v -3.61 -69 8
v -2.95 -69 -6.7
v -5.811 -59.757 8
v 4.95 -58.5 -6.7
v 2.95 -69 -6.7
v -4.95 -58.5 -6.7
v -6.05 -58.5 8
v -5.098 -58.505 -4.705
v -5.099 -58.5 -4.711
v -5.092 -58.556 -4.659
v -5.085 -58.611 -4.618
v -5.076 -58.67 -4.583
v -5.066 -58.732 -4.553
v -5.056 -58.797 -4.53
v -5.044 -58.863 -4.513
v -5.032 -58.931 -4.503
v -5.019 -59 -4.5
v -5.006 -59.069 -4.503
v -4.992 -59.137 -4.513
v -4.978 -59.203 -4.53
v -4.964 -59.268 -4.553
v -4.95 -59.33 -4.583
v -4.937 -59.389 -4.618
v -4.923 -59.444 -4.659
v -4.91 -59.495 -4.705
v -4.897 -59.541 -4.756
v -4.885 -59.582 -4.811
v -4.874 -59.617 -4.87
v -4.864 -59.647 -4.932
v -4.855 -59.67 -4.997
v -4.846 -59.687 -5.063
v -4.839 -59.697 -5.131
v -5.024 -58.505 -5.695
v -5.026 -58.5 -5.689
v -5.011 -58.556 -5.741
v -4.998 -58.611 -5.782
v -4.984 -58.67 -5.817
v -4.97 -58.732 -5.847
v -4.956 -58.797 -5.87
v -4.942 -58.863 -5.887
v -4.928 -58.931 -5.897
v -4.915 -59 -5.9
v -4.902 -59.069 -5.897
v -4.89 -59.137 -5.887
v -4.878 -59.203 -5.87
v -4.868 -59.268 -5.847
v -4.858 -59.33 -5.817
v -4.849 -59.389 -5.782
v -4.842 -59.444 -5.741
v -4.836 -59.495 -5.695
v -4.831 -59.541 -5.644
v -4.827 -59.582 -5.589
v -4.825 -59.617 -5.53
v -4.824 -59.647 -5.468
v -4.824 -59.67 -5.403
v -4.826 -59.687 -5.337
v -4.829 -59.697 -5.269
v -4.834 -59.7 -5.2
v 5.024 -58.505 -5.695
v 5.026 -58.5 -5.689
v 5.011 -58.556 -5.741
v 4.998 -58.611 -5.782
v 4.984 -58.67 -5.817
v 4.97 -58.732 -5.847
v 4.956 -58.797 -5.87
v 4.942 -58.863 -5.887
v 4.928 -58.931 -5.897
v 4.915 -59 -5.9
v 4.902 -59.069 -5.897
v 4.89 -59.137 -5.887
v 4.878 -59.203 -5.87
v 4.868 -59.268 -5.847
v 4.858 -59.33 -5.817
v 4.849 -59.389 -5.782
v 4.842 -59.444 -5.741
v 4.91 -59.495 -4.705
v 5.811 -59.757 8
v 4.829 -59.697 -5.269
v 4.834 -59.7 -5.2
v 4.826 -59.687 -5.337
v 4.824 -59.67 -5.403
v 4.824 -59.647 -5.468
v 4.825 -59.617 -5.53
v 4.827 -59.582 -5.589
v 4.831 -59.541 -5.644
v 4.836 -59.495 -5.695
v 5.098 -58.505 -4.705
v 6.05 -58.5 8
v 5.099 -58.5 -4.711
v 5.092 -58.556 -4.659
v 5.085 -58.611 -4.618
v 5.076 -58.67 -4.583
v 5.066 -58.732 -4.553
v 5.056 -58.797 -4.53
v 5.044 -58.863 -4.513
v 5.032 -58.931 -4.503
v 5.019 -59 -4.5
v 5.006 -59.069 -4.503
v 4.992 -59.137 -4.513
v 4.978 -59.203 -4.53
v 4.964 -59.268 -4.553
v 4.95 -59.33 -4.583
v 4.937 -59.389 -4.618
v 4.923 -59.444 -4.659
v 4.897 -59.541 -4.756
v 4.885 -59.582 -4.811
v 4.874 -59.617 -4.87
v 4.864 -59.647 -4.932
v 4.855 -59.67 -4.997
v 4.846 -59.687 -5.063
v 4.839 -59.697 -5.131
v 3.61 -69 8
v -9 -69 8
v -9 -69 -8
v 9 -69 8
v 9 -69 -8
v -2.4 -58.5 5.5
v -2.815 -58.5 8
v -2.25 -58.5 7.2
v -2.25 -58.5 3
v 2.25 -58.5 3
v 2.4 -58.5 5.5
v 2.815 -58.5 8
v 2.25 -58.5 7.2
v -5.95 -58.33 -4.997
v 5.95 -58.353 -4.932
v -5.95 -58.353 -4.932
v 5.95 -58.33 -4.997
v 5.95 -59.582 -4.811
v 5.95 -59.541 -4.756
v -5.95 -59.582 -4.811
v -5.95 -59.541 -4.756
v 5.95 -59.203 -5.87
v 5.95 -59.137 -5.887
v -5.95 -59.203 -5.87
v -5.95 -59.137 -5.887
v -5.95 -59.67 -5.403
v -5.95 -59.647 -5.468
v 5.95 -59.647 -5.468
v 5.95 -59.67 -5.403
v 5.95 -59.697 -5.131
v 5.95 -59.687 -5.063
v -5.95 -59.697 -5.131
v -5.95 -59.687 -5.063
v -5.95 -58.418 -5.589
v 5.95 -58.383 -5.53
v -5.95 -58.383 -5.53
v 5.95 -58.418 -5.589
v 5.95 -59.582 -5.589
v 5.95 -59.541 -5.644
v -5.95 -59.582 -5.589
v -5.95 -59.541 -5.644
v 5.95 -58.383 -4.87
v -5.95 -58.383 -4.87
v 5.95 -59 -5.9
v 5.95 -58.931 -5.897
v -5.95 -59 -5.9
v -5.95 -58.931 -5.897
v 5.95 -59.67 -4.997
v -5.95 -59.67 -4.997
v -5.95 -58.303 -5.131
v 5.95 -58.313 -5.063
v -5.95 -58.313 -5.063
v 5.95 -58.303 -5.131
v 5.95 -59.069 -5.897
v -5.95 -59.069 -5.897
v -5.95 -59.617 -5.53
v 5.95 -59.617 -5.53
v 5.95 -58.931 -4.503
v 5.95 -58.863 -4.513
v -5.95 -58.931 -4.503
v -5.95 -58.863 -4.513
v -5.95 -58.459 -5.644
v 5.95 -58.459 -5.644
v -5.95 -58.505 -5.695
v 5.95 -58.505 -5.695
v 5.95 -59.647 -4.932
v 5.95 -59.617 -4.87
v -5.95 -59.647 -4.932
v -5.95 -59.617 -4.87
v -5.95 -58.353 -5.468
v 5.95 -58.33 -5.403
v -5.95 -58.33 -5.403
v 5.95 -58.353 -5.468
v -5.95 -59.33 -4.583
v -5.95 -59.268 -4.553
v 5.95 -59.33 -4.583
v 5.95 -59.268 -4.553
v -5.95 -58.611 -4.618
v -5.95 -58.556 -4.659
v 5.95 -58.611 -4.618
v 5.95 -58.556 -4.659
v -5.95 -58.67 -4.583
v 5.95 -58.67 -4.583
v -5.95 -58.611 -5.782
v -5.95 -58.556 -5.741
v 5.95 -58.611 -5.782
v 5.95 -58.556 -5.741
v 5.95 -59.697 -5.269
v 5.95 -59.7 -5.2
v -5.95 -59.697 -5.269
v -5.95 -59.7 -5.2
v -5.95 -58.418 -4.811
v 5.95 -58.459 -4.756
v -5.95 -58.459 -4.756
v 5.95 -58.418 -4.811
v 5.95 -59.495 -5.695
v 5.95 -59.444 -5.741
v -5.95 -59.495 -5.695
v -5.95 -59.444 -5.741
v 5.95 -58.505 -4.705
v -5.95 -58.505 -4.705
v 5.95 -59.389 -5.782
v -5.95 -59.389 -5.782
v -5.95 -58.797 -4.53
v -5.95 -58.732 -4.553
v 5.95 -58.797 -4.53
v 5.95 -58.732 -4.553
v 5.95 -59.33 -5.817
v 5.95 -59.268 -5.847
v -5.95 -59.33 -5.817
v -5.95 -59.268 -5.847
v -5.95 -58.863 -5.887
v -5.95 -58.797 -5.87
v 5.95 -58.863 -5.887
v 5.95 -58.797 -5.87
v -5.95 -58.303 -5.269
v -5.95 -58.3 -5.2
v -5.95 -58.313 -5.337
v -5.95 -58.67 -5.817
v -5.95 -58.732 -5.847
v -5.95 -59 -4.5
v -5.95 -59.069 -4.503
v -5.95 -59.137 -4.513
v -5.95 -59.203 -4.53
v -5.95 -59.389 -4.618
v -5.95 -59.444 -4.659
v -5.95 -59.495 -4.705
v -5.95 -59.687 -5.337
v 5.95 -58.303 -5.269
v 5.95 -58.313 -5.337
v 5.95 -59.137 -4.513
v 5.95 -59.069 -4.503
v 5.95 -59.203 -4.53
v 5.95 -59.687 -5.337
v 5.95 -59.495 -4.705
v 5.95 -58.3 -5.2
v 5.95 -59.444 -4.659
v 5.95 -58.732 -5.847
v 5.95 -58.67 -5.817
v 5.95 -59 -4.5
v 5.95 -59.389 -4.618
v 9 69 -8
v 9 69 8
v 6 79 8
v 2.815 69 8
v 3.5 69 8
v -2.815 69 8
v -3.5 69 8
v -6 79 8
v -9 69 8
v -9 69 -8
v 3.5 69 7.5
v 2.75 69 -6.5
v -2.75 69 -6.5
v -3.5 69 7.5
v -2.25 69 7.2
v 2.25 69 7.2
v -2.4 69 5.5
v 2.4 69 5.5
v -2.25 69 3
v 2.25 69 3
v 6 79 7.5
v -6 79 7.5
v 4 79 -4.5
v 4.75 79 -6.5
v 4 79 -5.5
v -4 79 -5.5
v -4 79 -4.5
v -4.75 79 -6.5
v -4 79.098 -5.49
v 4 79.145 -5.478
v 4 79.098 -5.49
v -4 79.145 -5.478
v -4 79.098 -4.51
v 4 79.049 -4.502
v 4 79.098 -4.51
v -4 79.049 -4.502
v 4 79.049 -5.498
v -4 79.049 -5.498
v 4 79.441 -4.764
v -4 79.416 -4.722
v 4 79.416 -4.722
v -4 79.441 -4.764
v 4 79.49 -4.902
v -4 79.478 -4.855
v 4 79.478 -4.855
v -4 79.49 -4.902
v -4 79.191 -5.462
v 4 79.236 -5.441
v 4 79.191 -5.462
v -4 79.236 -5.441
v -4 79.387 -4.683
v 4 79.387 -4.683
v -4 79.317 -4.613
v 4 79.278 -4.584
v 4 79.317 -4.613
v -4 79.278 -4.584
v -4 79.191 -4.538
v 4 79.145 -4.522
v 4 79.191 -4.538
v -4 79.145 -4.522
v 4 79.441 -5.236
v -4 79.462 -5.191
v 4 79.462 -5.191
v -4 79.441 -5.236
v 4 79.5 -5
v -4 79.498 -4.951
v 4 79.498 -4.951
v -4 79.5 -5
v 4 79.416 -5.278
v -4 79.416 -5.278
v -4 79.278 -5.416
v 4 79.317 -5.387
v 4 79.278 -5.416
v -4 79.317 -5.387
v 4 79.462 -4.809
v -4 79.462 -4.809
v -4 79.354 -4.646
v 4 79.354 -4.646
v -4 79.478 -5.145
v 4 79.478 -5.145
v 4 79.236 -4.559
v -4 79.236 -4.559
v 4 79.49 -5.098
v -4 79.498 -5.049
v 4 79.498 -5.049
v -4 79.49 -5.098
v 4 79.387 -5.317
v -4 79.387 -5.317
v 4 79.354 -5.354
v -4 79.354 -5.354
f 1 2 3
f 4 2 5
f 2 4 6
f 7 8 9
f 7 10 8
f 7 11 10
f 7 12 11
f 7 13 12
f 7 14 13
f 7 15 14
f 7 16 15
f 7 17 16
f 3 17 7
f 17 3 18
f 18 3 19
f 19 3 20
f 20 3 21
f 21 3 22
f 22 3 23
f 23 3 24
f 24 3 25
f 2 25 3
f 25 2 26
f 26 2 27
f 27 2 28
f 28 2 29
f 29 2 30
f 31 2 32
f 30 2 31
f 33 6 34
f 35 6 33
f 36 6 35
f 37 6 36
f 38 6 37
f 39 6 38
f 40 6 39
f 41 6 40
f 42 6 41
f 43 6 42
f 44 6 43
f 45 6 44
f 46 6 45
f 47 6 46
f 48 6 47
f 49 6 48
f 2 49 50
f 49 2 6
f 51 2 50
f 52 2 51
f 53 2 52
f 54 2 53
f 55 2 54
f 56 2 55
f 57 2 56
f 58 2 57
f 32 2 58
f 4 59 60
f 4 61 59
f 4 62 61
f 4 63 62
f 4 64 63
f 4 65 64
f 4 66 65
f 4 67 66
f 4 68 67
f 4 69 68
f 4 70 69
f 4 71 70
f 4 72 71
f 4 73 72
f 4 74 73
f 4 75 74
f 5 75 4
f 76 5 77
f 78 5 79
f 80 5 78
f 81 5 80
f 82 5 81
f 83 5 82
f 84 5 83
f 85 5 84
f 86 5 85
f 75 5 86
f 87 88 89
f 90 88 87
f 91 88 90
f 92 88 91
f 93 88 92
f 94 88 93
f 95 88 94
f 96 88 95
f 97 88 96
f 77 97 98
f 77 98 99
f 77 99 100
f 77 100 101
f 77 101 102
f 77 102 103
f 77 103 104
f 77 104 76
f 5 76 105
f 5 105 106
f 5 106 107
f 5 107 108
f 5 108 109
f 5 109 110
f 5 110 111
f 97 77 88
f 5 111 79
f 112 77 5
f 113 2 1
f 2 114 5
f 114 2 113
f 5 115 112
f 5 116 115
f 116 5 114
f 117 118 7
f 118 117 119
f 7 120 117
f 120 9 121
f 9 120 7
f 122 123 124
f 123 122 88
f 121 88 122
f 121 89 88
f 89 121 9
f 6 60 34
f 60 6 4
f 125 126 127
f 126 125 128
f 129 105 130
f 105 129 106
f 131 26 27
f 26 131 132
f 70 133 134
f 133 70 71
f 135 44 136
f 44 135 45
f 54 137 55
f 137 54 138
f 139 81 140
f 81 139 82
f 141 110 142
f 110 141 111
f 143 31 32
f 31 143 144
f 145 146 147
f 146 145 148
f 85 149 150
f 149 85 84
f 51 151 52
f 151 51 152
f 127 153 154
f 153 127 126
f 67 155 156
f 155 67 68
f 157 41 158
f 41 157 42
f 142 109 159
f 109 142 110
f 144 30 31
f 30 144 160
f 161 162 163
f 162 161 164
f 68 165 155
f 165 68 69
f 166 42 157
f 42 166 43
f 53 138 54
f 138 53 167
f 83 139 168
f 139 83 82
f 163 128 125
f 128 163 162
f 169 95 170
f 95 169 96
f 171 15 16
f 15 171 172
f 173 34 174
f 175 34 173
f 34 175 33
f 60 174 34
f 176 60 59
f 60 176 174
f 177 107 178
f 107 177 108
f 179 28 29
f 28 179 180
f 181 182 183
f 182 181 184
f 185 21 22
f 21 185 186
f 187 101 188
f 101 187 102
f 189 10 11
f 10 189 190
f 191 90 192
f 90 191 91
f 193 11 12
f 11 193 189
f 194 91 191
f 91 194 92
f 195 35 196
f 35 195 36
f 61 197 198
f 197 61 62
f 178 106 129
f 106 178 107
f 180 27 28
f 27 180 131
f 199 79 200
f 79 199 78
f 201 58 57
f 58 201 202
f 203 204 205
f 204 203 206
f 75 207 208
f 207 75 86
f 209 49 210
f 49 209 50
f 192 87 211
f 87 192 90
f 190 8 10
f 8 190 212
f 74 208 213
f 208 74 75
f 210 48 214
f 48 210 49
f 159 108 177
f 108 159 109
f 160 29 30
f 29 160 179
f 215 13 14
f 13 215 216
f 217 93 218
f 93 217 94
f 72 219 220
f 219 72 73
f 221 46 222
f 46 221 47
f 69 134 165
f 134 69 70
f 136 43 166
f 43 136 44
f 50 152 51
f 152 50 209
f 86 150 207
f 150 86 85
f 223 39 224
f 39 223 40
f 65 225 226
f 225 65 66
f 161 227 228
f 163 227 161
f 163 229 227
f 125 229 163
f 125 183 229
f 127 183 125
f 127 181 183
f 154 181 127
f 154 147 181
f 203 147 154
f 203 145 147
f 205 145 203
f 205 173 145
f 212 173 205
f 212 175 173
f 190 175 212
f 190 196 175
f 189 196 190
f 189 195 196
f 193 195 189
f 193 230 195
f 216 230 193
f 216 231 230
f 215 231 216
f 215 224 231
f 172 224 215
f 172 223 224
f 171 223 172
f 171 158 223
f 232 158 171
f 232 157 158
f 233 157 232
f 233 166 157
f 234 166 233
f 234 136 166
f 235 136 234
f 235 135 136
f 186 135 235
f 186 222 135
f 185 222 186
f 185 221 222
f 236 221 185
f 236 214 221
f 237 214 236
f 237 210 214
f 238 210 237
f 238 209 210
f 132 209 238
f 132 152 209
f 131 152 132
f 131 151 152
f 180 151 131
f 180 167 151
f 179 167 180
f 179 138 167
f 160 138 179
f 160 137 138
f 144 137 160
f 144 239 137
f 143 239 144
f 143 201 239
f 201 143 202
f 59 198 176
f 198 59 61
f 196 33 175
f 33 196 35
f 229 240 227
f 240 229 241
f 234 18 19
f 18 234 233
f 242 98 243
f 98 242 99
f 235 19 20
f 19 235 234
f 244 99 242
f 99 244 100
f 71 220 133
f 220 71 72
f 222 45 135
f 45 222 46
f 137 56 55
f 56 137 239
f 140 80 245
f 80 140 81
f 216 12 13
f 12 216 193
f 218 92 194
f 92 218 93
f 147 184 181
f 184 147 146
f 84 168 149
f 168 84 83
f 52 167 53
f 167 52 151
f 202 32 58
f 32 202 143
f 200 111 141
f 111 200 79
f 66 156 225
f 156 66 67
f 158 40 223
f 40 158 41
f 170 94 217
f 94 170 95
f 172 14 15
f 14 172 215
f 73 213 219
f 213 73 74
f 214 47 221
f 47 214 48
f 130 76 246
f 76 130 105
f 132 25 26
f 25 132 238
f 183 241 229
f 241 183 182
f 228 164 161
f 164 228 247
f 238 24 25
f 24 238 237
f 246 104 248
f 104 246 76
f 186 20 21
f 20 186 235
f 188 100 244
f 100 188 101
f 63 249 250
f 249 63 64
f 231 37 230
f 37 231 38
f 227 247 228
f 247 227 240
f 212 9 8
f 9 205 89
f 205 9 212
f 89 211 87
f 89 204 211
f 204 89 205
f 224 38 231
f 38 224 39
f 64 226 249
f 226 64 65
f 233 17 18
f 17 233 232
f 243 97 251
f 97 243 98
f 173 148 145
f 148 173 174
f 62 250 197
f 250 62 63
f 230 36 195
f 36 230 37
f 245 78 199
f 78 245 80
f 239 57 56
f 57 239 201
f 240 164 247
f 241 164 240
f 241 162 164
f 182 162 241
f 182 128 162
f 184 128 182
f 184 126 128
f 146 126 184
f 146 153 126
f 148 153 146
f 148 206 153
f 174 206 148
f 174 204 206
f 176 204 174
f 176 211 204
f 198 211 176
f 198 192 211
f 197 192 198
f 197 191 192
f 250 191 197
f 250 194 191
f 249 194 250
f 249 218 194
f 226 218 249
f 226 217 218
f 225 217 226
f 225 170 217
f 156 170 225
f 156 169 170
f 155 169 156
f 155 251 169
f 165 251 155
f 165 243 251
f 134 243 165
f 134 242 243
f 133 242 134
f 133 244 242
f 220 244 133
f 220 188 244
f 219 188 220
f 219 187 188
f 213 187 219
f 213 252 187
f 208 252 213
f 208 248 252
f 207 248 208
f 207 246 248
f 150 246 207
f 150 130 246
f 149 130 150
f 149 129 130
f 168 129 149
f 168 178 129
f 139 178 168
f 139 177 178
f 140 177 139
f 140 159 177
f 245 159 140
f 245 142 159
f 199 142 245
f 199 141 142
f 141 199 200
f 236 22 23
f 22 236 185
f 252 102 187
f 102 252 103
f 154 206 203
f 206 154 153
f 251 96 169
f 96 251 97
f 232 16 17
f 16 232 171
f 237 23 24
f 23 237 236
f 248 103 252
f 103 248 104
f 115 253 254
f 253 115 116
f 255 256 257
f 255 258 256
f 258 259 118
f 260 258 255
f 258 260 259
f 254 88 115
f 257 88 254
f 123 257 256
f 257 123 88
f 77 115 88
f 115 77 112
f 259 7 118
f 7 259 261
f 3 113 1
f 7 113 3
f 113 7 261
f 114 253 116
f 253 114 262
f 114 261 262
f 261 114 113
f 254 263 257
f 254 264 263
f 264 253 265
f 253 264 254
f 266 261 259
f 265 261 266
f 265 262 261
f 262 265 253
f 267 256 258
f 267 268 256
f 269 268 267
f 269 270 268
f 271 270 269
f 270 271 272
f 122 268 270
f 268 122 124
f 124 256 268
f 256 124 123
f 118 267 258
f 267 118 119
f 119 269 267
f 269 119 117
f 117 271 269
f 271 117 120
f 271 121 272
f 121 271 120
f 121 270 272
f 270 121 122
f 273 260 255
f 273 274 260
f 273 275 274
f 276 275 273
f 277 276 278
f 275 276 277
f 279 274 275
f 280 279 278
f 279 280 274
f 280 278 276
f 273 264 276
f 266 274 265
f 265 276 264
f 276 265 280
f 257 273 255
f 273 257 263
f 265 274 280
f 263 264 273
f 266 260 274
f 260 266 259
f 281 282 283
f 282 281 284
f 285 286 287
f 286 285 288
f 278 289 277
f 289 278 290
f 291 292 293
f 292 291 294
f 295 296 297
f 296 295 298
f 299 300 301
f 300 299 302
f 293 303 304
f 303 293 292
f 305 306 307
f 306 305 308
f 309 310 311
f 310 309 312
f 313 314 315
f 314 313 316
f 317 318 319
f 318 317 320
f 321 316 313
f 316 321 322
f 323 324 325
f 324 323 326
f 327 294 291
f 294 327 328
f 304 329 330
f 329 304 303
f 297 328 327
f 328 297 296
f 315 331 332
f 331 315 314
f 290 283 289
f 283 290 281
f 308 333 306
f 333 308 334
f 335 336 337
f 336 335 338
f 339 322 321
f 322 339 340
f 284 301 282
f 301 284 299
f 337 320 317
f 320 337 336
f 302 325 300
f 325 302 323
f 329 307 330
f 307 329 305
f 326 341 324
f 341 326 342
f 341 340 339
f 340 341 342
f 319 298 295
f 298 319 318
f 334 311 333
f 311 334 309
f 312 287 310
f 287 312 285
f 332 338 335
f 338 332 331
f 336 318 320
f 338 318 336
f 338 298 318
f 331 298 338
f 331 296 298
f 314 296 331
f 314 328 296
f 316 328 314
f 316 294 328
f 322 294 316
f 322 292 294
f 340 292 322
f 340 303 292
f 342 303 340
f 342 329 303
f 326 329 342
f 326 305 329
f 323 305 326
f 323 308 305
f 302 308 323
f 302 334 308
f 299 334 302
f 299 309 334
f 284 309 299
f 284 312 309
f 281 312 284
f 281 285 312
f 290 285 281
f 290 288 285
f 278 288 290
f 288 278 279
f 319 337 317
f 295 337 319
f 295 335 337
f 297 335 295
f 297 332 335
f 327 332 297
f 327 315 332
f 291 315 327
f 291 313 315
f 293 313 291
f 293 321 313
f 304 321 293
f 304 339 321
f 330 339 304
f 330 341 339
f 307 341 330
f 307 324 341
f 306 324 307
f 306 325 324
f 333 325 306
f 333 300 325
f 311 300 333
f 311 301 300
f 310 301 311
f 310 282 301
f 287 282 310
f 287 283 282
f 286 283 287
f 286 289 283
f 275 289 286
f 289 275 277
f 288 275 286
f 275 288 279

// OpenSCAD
// file: ../modules/spline_profile.scad
// ====================================================================
// Cellophane Spline Groove & Compliant Spring Clamping Strip Module
// High-tension retention system with compliant split-core spring prongs
// and directional grip teeth to hold cellophane drum-tight without slipping
// ====================================================================
include <../config.scad>

// Negative volume for cutting the spline groove into any beam surface
// Cuts into the -Z direction from Z=0.
// Axis parameter: "Y" (default) or "X"
module spline_groove_negative(length = 100, axis = "Y") {
    gw = GROOVE_WIDTH; // 4.5 mm
    gd = GROOVE_DEPTH; // 5.0 mm
    
    // Cross-section profile of the groove (in X-Z plane)
    // Features a 45° lead-in chamfer at the mouth and internal retention undercuts
    module groove_cross_section_2d() {
        polygon(points = [
            [-(gw/2 + 0.6),  0.05], // Mouth chamfer outer left
            [-gw/2,         -0.80], // Mouth chamfer inner left
            [-gw/2 - 0.15,  -2.50], // Mid retention undercut left
            [-gw/2,         -gd],   // Bottom left
            [ gw/2,         -gd],   // Bottom right
            [ gw/2 + 0.15,  -2.50], // Mid retention undercut right
            [ gw/2,         -0.80], // Mouth chamfer inner right
            [ (gw/2 + 0.6),  0.05]  // Mouth chamfer outer right
        ]);
    }
    
    if (axis == "Y") {
        rotate([90, 0, 0])
        linear_extrude(height = length, center = true) {
            groove_cross_section_2d();
        }
    } else {
        rotate([0, 90, 0])
        rotate([0, 0, 90])
        linear_extrude(height = length, center = true) {
            groove_cross_section_2d();
        }
    }
}

// 2D Profile of the Compliant Spring-Wedge Spline Clip (X-Z plane)
// Has a central vertical expansion slot that allows the two prongs to flex inward
// during insertion and exert continuous outward spring pressure against the cellophane.
module spline_clip_profile_2d(width_offset = 0) {
    w_cap   = 7.0; // Top thumb-press cap width
    h_cap   = 1.8; // Cap thickness
    h_depth = 4.6; // Insertion depth
    
    // Base dimensions + user/grip offset
    w_shaft = 4.3 + width_offset; // Base shaft (tight fit in 4.5mm groove)
    w_barb1 = 4.7 + width_offset; // Upper retention barb (interferes with groove)
    w_barb2 = 4.8 + width_offset; // Lower primary clamping barb
    w_nose  = 3.2;                // Lead-in nose
    
    difference() {
        union() {
            // 1. Top Thumb-Press Cap (acts as depth stop & pry lip)
            translate([0, h_cap / 2])
            hull() {
                translate([-w_cap/2 + 0.8, -h_cap/2 + 0.4]) circle(r = 0.4, $fn=16);
                translate([ w_cap/2 - 0.8, -h_cap/2 + 0.4]) circle(r = 0.4, $fn=16);
                translate([-w_cap/2 + 1.2,  h_cap/2 - 0.4]) circle(r = 0.4, $fn=16);
                translate([ w_cap/2 - 1.2,  h_cap/2 - 0.4]) circle(r = 0.4, $fn=16);
            }
            
            // 2. Dual-Barb Clamping Prongs
            polygon(points = [
                [-w_shaft/2,        0.0],
                [-w_shaft/2,       -1.2],
                [-w_barb1/2,       -1.9], // Upper barb tooth
                [-w_shaft/2,       -2.1],
                [-w_shaft/2,       -2.8],
                [-w_barb2/2,       -3.5], // Lower primary clamping tooth
                [-w_nose/2,        -h_depth], // Tapered nose
                [ w_nose/2,        -h_depth],
                [ w_barb2/2,       -3.5],
                [ w_shaft/2,       -2.8],
                [ w_shaft/2,       -2.1],
                [ w_barb1/2,       -1.9],
                [ w_shaft/2,       -1.2],
                [ w_shaft/2,        0.0]
            ]);
        }
        
        // 3. Central Vertical Expansion Kerf (0.9 mm compliant flex slot)
        // Splits the shaft into two spring prongs that flex inward upon insertion
        translate([0, -h_depth/2 - 0.6])
        hull() {
            translate([0,  h_depth/2 - 1.2]) circle(r = 0.45, $fn=16);
            translate([0, -h_depth/2 + 0.5]) circle(r = 0.45, $fn=16);
        }
    }
}

// 3D Snap-in Locking Spline Clip (oriented along Y axis by default)
module spline_clip(length = 150, axis = "Y", width_offset = 0) {
    if (axis == "Y") {
        rotate([90, 0, 0])
        linear_extrude(height = length, center = true) {
            spline_clip_profile_2d(width_offset = width_offset);
        }
    } else {
        rotate([0, 90, 0])
        rotate([0, 0, 90])
        linear_extrude(height = length, center = true) {
            spline_clip_profile_2d(width_offset = width_offset);
        }
    }
}
// file: ../modules/dovetail.scad
// ====================================================================
// Dual-Taper Wedge Dovetail Module (Peg-Free, Self-Locking)
// Main Frame Wedge & Mini Door Wedge Systems
// ====================================================================
include <../config.scad>

// 2D Profile of Dovetail Slice in X-Y plane
module dovetail_slice_2d(root_w, tip_w, depth) {
    w_r = root_w / 2;
    w_t = tip_w / 2;
    polygon(points = [
        [-w_r, 0],
        [-w_t, depth],
        [ w_t, depth],
        [ w_r, 0]
    ]);
}

// ----------------------------------------------------
// 1. Main Frame Dual-Taper Wedge Dovetail (24 x 24 mm Profile)
// ----------------------------------------------------
module male_dovetail(
    w = BEAM_WIDTH,
    h = BEAM_HEIGHT,
    depth = DOVETAIL_DEPTH,
    tol = 0
) {
    z_bot = -h/2 + 2.0 + tol; // 2mm bottom ledge
    z_top =  h/2 - tol;       // Flush at top of beam
    
    b_root = FRAME_BOT_ROOT - 2*tol;
    b_tip  = FRAME_BOT_TIP  - 2*tol;
    t_root = FRAME_TOP_ROOT - 2*tol;
    t_tip  = FRAME_TOP_TIP  - 2*tol;
    
    union() {
        hull() {
            translate([0, 0, z_bot])
            linear_extrude(height = 0.5)
            dovetail_slice_2d(b_root, b_tip, depth);
            
            translate([0, 0, z_top - 0.5])
            linear_extrude(height = 0.5)
            dovetail_slice_2d(t_root, t_tip, depth);
        }
        
        // Tactile snap detent bead on the tip face at the bottom
        translate([0, depth, z_bot + 2.0])
        rotate([0, 90, 0])
        cylinder(r = 0.6, h = b_tip - 2, center = true);
    }
}

module female_dovetail_pocket(
    w = BEAM_WIDTH,
    h = BEAM_HEIGHT,
    depth = DOVETAIL_DEPTH,
    tol = TOL_DOVETAIL
) {
    z_bot = -h/2 + 2.0 - tol;
    z_top =  h/2 + 2.0; // Open through top
    
    b_root = FRAME_BOT_ROOT + 2*tol;
    b_tip  = FRAME_BOT_TIP  + 2*tol;
    t_root = FRAME_TOP_ROOT + 2*tol;
    t_tip  = FRAME_TOP_TIP  + 2*tol;
    
    union() {
        mirror([0, 1, 0])
        hull() {
            translate([0, 0, z_bot])
            linear_extrude(height = 0.5)
            dovetail_slice_2d(b_root, b_tip, depth + 0.6);
            
            translate([0, 0, z_top])
            linear_extrude(height = 0.5)
            dovetail_slice_2d(t_root, t_tip, depth + 0.6);
        }
        
        // Matching snap detent groove in the pocket floor
        translate([0, -depth, z_bot + 2.0])
        rotate([0, 90, 0])
        cylinder(r = 0.8, h = b_tip + 2, center = true);
    }
}

// ----------------------------------------------------
// 2. Mini Door Dual-Taper Wedge Dovetail (18 x 16 mm Profile)
// ----------------------------------------------------
module mini_male_dovetail(
    w = DOOR_PROFILE_W,
    h = DOOR_PROFILE_T,
    depth = DOOR_DEPTH,
    tol = 0
) {
    z_bot = -h/2 + 1.5 + tol;
    z_top =  h/2 - tol;
    
    b_root = DOOR_BOT_ROOT - 2*tol;
    b_tip  = DOOR_BOT_TIP  - 2*tol;
    t_root = DOOR_TOP_ROOT - 2*tol;
    t_tip  = DOOR_TOP_TIP  - 2*tol;
    
    union() {
        hull() {
            translate([0, 0, z_bot])
            linear_extrude(height = 0.5)
            dovetail_slice_2d(b_root, b_tip, depth);
            
            translate([0, 0, z_top - 0.5])
            linear_extrude(height = 0.5)
            dovetail_slice_2d(t_root, t_tip, depth);
        }
        
        // Snap detent bead
        translate([0, depth, z_bot + 1.5])
        rotate([0, 90, 0])
        cylinder(r = 0.5, h = b_tip - 1.5, center = true);
    }
}

module mini_female_dovetail_pocket(
    w = DOOR_PROFILE_W,
    h = DOOR_PROFILE_T,
    depth = DOOR_DEPTH,
    tol = TOL_DOVETAIL
) {
    z_bot = -h/2 + 1.5 - tol;
    z_top =  h/2 + 2.0; // Open through top
    
    b_root = DOOR_BOT_ROOT + 2*tol;
    b_tip  = DOOR_BOT_TIP  + 2*tol;
    t_root = DOOR_TOP_ROOT + 2*tol;
    t_tip  = DOOR_TOP_TIP  + 2*tol;
    
    union() {
        mirror([0, 1, 0])
        hull() {
            translate([0, 0, z_bot])
            linear_extrude(height = 0.5)
            dovetail_slice_2d(b_root, b_tip, depth + 0.5);
            
            translate([0, 0, z_top])
            linear_extrude(height = 0.5)
            dovetail_slice_2d(t_root, t_tip, depth + 0.5);
        }
        
        // Matching detent groove
        translate([0, -depth, z_bot + 1.5])
        rotate([0, 90, 0])
        cylinder(r = 0.7, h = b_tip + 2, center = true);
    }
}
// file: ../config.scad
// ====================================================================
// Bambu Lab A1 Enclosure - Global Configuration Parameters
// Ultra-Minimal 8-Part Modular Kit (Face-Overlay Architecture)
// ====================================================================

// --- Print Bed Limits ---
MAX_PRINT_X = 256;
MAX_PRINT_Y = 256;
MAX_PRINT_Z = 256;
SAFE_PART_MAX_LEN = 240; // Conservative safety margin for brims

// --- Internal Enclosure Dimensions (mm) ---
// Sized for Bambu Lab A1 bed-slinger travel, right poop bucket, and top BMCU 370c
INTERNAL_WIDTH  = 560; // X axis clearance (A1 + toolhead + right poop bucket)
INTERNAL_DEPTH  = 580; // Y axis clearance (Bed travel + rear cable loop buffer)
INTERNAL_HEIGHT = 710; // Z axis clearance (Gantry + BMCU 370c rotating mount + spool)

// --- Standardized Modular Grid Lengths ---
FRAME_EDGE_LEN  = 185.0; // Standardized length for ALL frame edge segments
DOOR_EDGE_LEN   = 138.0; // Standardized length for ALL door/roof edge segments

// --- Frame Profile Dimensions ---
BEAM_WIDTH   = 24.0;  // Frame beam width X/Y (mm)
BEAM_HEIGHT  = 24.0;  // Frame beam height Z (mm)
CORNER_SIZE  = 36.0;  // 3-way cubic corner junction dimension

// --- Door Profile Dimensions (Slim Face-Overlay) ---
DOOR_PROFILE_W = 18.0; // Width across door frame face (mm)
DOOR_PROFILE_T = 16.0; // Thickness of door frame (mm)
DOOR_CORNER_W  = 25.0; // L-shaped door corner block dimension (mm)

// --- Tolerances (FDM 3D Printing tuned for Bambu Lab A1 0.4mm nozzle) ---
TOL_TIGHT    = 0.15; // Tight press fit (spline clips)
TOL_DOVETAIL = 0.20; // Sliding interlock fit (wedge dovetails)
TOL_HINGE    = 0.30; // Free rotating hinge pins
TOL_LOOSE    = 0.40; // Clearance gaps

// --- Cellophane Spline Groove Specifications ---
GROOVE_WIDTH  = 4.5; // Width of U-channel
GROOVE_DEPTH  = 5.0; // Depth of U-channel

// --- Peg-Free Dual-Taper Wedge Dovetail Dimensions ---
DOVETAIL_DEPTH = 15.0; // Length of wedge insert (mm)

// Main Frame Wedge Dovetail
FRAME_BOT_ROOT = 7.5;  // Bottom root width (narrow entry)
FRAME_BOT_TIP  = 13.5; // Bottom tip width
FRAME_TOP_ROOT = 9.5;  // Top root width (wide wedge lock)
FRAME_TOP_TIP  = 16.5; // Top tip width

// Mini Door Wedge Dovetail (scaled for 18x16 mm door profile)
DOOR_BOT_ROOT  = 5.5;
DOOR_BOT_TIP   = 9.5;
DOOR_TOP_ROOT  = 7.0;
DOOR_TOP_TIP   = 12.0;
DOOR_DEPTH     = 10.0;

// --- Filament PTFE Tube Routing (Bottom Side Beam) ---
PTFE_TUBE_OD  = 4.0; // Standard PTFE bowden tube outer diameter (mm)
PTFE_HOLE_DIA = 4.3; // Slip-fit through-hole diameter with retention grip
PTFE_TUBE_CNT = 4;   // 4 dedicated filament tubes for multi-material / drybox
PTFE_ANGLE    = 35;  // Upward angle toward toolhead/BMCU (degrees)

// --- Render Quality ($fn) ---
$fn = $preview ? 24 : 64;
// main file
// ====================================================================
// 6. Standard Door Edge Strut (Part 6 of 8)
// Standardized 138 mm slim door frame strut (18 x 16 mm profile)
// Features mini male wedge on +Y end, mini female open-top pocket on -Y end
// Front-facing spline groove for mounting cellophane directly on the door
// ====================================================================
include <../config.scad>
use <../modules/dovetail.scad>
use <../modules/spline_profile.scad>

module door_edge(
    length = DOOR_EDGE_LEN,
    width  = DOOR_PROFILE_W,
    thick  = DOOR_PROFILE_T
) {
    difference() {
        // Main door frame strut body
        cube([width, length, thick], center = true);
        
        // Spline groove on FRONT (+Z) face along Y axis
        translate([0, 0, thick/2])
        spline_groove_negative(length = length + 2, axis = "Y");
        
        // Mini female open-top wedge pocket at -Y end
        translate([0, -length/2, 0])
        rotate([0, 0, 180])
        mini_female_dovetail_pocket(w = width, h = thick);
    }
    
    // Mini male wedge tenon at +Y end
    translate([0, length/2, 0])
    mini_male_dovetail(w = width, h = thick);
}

// Standalone preview
door_edge();
